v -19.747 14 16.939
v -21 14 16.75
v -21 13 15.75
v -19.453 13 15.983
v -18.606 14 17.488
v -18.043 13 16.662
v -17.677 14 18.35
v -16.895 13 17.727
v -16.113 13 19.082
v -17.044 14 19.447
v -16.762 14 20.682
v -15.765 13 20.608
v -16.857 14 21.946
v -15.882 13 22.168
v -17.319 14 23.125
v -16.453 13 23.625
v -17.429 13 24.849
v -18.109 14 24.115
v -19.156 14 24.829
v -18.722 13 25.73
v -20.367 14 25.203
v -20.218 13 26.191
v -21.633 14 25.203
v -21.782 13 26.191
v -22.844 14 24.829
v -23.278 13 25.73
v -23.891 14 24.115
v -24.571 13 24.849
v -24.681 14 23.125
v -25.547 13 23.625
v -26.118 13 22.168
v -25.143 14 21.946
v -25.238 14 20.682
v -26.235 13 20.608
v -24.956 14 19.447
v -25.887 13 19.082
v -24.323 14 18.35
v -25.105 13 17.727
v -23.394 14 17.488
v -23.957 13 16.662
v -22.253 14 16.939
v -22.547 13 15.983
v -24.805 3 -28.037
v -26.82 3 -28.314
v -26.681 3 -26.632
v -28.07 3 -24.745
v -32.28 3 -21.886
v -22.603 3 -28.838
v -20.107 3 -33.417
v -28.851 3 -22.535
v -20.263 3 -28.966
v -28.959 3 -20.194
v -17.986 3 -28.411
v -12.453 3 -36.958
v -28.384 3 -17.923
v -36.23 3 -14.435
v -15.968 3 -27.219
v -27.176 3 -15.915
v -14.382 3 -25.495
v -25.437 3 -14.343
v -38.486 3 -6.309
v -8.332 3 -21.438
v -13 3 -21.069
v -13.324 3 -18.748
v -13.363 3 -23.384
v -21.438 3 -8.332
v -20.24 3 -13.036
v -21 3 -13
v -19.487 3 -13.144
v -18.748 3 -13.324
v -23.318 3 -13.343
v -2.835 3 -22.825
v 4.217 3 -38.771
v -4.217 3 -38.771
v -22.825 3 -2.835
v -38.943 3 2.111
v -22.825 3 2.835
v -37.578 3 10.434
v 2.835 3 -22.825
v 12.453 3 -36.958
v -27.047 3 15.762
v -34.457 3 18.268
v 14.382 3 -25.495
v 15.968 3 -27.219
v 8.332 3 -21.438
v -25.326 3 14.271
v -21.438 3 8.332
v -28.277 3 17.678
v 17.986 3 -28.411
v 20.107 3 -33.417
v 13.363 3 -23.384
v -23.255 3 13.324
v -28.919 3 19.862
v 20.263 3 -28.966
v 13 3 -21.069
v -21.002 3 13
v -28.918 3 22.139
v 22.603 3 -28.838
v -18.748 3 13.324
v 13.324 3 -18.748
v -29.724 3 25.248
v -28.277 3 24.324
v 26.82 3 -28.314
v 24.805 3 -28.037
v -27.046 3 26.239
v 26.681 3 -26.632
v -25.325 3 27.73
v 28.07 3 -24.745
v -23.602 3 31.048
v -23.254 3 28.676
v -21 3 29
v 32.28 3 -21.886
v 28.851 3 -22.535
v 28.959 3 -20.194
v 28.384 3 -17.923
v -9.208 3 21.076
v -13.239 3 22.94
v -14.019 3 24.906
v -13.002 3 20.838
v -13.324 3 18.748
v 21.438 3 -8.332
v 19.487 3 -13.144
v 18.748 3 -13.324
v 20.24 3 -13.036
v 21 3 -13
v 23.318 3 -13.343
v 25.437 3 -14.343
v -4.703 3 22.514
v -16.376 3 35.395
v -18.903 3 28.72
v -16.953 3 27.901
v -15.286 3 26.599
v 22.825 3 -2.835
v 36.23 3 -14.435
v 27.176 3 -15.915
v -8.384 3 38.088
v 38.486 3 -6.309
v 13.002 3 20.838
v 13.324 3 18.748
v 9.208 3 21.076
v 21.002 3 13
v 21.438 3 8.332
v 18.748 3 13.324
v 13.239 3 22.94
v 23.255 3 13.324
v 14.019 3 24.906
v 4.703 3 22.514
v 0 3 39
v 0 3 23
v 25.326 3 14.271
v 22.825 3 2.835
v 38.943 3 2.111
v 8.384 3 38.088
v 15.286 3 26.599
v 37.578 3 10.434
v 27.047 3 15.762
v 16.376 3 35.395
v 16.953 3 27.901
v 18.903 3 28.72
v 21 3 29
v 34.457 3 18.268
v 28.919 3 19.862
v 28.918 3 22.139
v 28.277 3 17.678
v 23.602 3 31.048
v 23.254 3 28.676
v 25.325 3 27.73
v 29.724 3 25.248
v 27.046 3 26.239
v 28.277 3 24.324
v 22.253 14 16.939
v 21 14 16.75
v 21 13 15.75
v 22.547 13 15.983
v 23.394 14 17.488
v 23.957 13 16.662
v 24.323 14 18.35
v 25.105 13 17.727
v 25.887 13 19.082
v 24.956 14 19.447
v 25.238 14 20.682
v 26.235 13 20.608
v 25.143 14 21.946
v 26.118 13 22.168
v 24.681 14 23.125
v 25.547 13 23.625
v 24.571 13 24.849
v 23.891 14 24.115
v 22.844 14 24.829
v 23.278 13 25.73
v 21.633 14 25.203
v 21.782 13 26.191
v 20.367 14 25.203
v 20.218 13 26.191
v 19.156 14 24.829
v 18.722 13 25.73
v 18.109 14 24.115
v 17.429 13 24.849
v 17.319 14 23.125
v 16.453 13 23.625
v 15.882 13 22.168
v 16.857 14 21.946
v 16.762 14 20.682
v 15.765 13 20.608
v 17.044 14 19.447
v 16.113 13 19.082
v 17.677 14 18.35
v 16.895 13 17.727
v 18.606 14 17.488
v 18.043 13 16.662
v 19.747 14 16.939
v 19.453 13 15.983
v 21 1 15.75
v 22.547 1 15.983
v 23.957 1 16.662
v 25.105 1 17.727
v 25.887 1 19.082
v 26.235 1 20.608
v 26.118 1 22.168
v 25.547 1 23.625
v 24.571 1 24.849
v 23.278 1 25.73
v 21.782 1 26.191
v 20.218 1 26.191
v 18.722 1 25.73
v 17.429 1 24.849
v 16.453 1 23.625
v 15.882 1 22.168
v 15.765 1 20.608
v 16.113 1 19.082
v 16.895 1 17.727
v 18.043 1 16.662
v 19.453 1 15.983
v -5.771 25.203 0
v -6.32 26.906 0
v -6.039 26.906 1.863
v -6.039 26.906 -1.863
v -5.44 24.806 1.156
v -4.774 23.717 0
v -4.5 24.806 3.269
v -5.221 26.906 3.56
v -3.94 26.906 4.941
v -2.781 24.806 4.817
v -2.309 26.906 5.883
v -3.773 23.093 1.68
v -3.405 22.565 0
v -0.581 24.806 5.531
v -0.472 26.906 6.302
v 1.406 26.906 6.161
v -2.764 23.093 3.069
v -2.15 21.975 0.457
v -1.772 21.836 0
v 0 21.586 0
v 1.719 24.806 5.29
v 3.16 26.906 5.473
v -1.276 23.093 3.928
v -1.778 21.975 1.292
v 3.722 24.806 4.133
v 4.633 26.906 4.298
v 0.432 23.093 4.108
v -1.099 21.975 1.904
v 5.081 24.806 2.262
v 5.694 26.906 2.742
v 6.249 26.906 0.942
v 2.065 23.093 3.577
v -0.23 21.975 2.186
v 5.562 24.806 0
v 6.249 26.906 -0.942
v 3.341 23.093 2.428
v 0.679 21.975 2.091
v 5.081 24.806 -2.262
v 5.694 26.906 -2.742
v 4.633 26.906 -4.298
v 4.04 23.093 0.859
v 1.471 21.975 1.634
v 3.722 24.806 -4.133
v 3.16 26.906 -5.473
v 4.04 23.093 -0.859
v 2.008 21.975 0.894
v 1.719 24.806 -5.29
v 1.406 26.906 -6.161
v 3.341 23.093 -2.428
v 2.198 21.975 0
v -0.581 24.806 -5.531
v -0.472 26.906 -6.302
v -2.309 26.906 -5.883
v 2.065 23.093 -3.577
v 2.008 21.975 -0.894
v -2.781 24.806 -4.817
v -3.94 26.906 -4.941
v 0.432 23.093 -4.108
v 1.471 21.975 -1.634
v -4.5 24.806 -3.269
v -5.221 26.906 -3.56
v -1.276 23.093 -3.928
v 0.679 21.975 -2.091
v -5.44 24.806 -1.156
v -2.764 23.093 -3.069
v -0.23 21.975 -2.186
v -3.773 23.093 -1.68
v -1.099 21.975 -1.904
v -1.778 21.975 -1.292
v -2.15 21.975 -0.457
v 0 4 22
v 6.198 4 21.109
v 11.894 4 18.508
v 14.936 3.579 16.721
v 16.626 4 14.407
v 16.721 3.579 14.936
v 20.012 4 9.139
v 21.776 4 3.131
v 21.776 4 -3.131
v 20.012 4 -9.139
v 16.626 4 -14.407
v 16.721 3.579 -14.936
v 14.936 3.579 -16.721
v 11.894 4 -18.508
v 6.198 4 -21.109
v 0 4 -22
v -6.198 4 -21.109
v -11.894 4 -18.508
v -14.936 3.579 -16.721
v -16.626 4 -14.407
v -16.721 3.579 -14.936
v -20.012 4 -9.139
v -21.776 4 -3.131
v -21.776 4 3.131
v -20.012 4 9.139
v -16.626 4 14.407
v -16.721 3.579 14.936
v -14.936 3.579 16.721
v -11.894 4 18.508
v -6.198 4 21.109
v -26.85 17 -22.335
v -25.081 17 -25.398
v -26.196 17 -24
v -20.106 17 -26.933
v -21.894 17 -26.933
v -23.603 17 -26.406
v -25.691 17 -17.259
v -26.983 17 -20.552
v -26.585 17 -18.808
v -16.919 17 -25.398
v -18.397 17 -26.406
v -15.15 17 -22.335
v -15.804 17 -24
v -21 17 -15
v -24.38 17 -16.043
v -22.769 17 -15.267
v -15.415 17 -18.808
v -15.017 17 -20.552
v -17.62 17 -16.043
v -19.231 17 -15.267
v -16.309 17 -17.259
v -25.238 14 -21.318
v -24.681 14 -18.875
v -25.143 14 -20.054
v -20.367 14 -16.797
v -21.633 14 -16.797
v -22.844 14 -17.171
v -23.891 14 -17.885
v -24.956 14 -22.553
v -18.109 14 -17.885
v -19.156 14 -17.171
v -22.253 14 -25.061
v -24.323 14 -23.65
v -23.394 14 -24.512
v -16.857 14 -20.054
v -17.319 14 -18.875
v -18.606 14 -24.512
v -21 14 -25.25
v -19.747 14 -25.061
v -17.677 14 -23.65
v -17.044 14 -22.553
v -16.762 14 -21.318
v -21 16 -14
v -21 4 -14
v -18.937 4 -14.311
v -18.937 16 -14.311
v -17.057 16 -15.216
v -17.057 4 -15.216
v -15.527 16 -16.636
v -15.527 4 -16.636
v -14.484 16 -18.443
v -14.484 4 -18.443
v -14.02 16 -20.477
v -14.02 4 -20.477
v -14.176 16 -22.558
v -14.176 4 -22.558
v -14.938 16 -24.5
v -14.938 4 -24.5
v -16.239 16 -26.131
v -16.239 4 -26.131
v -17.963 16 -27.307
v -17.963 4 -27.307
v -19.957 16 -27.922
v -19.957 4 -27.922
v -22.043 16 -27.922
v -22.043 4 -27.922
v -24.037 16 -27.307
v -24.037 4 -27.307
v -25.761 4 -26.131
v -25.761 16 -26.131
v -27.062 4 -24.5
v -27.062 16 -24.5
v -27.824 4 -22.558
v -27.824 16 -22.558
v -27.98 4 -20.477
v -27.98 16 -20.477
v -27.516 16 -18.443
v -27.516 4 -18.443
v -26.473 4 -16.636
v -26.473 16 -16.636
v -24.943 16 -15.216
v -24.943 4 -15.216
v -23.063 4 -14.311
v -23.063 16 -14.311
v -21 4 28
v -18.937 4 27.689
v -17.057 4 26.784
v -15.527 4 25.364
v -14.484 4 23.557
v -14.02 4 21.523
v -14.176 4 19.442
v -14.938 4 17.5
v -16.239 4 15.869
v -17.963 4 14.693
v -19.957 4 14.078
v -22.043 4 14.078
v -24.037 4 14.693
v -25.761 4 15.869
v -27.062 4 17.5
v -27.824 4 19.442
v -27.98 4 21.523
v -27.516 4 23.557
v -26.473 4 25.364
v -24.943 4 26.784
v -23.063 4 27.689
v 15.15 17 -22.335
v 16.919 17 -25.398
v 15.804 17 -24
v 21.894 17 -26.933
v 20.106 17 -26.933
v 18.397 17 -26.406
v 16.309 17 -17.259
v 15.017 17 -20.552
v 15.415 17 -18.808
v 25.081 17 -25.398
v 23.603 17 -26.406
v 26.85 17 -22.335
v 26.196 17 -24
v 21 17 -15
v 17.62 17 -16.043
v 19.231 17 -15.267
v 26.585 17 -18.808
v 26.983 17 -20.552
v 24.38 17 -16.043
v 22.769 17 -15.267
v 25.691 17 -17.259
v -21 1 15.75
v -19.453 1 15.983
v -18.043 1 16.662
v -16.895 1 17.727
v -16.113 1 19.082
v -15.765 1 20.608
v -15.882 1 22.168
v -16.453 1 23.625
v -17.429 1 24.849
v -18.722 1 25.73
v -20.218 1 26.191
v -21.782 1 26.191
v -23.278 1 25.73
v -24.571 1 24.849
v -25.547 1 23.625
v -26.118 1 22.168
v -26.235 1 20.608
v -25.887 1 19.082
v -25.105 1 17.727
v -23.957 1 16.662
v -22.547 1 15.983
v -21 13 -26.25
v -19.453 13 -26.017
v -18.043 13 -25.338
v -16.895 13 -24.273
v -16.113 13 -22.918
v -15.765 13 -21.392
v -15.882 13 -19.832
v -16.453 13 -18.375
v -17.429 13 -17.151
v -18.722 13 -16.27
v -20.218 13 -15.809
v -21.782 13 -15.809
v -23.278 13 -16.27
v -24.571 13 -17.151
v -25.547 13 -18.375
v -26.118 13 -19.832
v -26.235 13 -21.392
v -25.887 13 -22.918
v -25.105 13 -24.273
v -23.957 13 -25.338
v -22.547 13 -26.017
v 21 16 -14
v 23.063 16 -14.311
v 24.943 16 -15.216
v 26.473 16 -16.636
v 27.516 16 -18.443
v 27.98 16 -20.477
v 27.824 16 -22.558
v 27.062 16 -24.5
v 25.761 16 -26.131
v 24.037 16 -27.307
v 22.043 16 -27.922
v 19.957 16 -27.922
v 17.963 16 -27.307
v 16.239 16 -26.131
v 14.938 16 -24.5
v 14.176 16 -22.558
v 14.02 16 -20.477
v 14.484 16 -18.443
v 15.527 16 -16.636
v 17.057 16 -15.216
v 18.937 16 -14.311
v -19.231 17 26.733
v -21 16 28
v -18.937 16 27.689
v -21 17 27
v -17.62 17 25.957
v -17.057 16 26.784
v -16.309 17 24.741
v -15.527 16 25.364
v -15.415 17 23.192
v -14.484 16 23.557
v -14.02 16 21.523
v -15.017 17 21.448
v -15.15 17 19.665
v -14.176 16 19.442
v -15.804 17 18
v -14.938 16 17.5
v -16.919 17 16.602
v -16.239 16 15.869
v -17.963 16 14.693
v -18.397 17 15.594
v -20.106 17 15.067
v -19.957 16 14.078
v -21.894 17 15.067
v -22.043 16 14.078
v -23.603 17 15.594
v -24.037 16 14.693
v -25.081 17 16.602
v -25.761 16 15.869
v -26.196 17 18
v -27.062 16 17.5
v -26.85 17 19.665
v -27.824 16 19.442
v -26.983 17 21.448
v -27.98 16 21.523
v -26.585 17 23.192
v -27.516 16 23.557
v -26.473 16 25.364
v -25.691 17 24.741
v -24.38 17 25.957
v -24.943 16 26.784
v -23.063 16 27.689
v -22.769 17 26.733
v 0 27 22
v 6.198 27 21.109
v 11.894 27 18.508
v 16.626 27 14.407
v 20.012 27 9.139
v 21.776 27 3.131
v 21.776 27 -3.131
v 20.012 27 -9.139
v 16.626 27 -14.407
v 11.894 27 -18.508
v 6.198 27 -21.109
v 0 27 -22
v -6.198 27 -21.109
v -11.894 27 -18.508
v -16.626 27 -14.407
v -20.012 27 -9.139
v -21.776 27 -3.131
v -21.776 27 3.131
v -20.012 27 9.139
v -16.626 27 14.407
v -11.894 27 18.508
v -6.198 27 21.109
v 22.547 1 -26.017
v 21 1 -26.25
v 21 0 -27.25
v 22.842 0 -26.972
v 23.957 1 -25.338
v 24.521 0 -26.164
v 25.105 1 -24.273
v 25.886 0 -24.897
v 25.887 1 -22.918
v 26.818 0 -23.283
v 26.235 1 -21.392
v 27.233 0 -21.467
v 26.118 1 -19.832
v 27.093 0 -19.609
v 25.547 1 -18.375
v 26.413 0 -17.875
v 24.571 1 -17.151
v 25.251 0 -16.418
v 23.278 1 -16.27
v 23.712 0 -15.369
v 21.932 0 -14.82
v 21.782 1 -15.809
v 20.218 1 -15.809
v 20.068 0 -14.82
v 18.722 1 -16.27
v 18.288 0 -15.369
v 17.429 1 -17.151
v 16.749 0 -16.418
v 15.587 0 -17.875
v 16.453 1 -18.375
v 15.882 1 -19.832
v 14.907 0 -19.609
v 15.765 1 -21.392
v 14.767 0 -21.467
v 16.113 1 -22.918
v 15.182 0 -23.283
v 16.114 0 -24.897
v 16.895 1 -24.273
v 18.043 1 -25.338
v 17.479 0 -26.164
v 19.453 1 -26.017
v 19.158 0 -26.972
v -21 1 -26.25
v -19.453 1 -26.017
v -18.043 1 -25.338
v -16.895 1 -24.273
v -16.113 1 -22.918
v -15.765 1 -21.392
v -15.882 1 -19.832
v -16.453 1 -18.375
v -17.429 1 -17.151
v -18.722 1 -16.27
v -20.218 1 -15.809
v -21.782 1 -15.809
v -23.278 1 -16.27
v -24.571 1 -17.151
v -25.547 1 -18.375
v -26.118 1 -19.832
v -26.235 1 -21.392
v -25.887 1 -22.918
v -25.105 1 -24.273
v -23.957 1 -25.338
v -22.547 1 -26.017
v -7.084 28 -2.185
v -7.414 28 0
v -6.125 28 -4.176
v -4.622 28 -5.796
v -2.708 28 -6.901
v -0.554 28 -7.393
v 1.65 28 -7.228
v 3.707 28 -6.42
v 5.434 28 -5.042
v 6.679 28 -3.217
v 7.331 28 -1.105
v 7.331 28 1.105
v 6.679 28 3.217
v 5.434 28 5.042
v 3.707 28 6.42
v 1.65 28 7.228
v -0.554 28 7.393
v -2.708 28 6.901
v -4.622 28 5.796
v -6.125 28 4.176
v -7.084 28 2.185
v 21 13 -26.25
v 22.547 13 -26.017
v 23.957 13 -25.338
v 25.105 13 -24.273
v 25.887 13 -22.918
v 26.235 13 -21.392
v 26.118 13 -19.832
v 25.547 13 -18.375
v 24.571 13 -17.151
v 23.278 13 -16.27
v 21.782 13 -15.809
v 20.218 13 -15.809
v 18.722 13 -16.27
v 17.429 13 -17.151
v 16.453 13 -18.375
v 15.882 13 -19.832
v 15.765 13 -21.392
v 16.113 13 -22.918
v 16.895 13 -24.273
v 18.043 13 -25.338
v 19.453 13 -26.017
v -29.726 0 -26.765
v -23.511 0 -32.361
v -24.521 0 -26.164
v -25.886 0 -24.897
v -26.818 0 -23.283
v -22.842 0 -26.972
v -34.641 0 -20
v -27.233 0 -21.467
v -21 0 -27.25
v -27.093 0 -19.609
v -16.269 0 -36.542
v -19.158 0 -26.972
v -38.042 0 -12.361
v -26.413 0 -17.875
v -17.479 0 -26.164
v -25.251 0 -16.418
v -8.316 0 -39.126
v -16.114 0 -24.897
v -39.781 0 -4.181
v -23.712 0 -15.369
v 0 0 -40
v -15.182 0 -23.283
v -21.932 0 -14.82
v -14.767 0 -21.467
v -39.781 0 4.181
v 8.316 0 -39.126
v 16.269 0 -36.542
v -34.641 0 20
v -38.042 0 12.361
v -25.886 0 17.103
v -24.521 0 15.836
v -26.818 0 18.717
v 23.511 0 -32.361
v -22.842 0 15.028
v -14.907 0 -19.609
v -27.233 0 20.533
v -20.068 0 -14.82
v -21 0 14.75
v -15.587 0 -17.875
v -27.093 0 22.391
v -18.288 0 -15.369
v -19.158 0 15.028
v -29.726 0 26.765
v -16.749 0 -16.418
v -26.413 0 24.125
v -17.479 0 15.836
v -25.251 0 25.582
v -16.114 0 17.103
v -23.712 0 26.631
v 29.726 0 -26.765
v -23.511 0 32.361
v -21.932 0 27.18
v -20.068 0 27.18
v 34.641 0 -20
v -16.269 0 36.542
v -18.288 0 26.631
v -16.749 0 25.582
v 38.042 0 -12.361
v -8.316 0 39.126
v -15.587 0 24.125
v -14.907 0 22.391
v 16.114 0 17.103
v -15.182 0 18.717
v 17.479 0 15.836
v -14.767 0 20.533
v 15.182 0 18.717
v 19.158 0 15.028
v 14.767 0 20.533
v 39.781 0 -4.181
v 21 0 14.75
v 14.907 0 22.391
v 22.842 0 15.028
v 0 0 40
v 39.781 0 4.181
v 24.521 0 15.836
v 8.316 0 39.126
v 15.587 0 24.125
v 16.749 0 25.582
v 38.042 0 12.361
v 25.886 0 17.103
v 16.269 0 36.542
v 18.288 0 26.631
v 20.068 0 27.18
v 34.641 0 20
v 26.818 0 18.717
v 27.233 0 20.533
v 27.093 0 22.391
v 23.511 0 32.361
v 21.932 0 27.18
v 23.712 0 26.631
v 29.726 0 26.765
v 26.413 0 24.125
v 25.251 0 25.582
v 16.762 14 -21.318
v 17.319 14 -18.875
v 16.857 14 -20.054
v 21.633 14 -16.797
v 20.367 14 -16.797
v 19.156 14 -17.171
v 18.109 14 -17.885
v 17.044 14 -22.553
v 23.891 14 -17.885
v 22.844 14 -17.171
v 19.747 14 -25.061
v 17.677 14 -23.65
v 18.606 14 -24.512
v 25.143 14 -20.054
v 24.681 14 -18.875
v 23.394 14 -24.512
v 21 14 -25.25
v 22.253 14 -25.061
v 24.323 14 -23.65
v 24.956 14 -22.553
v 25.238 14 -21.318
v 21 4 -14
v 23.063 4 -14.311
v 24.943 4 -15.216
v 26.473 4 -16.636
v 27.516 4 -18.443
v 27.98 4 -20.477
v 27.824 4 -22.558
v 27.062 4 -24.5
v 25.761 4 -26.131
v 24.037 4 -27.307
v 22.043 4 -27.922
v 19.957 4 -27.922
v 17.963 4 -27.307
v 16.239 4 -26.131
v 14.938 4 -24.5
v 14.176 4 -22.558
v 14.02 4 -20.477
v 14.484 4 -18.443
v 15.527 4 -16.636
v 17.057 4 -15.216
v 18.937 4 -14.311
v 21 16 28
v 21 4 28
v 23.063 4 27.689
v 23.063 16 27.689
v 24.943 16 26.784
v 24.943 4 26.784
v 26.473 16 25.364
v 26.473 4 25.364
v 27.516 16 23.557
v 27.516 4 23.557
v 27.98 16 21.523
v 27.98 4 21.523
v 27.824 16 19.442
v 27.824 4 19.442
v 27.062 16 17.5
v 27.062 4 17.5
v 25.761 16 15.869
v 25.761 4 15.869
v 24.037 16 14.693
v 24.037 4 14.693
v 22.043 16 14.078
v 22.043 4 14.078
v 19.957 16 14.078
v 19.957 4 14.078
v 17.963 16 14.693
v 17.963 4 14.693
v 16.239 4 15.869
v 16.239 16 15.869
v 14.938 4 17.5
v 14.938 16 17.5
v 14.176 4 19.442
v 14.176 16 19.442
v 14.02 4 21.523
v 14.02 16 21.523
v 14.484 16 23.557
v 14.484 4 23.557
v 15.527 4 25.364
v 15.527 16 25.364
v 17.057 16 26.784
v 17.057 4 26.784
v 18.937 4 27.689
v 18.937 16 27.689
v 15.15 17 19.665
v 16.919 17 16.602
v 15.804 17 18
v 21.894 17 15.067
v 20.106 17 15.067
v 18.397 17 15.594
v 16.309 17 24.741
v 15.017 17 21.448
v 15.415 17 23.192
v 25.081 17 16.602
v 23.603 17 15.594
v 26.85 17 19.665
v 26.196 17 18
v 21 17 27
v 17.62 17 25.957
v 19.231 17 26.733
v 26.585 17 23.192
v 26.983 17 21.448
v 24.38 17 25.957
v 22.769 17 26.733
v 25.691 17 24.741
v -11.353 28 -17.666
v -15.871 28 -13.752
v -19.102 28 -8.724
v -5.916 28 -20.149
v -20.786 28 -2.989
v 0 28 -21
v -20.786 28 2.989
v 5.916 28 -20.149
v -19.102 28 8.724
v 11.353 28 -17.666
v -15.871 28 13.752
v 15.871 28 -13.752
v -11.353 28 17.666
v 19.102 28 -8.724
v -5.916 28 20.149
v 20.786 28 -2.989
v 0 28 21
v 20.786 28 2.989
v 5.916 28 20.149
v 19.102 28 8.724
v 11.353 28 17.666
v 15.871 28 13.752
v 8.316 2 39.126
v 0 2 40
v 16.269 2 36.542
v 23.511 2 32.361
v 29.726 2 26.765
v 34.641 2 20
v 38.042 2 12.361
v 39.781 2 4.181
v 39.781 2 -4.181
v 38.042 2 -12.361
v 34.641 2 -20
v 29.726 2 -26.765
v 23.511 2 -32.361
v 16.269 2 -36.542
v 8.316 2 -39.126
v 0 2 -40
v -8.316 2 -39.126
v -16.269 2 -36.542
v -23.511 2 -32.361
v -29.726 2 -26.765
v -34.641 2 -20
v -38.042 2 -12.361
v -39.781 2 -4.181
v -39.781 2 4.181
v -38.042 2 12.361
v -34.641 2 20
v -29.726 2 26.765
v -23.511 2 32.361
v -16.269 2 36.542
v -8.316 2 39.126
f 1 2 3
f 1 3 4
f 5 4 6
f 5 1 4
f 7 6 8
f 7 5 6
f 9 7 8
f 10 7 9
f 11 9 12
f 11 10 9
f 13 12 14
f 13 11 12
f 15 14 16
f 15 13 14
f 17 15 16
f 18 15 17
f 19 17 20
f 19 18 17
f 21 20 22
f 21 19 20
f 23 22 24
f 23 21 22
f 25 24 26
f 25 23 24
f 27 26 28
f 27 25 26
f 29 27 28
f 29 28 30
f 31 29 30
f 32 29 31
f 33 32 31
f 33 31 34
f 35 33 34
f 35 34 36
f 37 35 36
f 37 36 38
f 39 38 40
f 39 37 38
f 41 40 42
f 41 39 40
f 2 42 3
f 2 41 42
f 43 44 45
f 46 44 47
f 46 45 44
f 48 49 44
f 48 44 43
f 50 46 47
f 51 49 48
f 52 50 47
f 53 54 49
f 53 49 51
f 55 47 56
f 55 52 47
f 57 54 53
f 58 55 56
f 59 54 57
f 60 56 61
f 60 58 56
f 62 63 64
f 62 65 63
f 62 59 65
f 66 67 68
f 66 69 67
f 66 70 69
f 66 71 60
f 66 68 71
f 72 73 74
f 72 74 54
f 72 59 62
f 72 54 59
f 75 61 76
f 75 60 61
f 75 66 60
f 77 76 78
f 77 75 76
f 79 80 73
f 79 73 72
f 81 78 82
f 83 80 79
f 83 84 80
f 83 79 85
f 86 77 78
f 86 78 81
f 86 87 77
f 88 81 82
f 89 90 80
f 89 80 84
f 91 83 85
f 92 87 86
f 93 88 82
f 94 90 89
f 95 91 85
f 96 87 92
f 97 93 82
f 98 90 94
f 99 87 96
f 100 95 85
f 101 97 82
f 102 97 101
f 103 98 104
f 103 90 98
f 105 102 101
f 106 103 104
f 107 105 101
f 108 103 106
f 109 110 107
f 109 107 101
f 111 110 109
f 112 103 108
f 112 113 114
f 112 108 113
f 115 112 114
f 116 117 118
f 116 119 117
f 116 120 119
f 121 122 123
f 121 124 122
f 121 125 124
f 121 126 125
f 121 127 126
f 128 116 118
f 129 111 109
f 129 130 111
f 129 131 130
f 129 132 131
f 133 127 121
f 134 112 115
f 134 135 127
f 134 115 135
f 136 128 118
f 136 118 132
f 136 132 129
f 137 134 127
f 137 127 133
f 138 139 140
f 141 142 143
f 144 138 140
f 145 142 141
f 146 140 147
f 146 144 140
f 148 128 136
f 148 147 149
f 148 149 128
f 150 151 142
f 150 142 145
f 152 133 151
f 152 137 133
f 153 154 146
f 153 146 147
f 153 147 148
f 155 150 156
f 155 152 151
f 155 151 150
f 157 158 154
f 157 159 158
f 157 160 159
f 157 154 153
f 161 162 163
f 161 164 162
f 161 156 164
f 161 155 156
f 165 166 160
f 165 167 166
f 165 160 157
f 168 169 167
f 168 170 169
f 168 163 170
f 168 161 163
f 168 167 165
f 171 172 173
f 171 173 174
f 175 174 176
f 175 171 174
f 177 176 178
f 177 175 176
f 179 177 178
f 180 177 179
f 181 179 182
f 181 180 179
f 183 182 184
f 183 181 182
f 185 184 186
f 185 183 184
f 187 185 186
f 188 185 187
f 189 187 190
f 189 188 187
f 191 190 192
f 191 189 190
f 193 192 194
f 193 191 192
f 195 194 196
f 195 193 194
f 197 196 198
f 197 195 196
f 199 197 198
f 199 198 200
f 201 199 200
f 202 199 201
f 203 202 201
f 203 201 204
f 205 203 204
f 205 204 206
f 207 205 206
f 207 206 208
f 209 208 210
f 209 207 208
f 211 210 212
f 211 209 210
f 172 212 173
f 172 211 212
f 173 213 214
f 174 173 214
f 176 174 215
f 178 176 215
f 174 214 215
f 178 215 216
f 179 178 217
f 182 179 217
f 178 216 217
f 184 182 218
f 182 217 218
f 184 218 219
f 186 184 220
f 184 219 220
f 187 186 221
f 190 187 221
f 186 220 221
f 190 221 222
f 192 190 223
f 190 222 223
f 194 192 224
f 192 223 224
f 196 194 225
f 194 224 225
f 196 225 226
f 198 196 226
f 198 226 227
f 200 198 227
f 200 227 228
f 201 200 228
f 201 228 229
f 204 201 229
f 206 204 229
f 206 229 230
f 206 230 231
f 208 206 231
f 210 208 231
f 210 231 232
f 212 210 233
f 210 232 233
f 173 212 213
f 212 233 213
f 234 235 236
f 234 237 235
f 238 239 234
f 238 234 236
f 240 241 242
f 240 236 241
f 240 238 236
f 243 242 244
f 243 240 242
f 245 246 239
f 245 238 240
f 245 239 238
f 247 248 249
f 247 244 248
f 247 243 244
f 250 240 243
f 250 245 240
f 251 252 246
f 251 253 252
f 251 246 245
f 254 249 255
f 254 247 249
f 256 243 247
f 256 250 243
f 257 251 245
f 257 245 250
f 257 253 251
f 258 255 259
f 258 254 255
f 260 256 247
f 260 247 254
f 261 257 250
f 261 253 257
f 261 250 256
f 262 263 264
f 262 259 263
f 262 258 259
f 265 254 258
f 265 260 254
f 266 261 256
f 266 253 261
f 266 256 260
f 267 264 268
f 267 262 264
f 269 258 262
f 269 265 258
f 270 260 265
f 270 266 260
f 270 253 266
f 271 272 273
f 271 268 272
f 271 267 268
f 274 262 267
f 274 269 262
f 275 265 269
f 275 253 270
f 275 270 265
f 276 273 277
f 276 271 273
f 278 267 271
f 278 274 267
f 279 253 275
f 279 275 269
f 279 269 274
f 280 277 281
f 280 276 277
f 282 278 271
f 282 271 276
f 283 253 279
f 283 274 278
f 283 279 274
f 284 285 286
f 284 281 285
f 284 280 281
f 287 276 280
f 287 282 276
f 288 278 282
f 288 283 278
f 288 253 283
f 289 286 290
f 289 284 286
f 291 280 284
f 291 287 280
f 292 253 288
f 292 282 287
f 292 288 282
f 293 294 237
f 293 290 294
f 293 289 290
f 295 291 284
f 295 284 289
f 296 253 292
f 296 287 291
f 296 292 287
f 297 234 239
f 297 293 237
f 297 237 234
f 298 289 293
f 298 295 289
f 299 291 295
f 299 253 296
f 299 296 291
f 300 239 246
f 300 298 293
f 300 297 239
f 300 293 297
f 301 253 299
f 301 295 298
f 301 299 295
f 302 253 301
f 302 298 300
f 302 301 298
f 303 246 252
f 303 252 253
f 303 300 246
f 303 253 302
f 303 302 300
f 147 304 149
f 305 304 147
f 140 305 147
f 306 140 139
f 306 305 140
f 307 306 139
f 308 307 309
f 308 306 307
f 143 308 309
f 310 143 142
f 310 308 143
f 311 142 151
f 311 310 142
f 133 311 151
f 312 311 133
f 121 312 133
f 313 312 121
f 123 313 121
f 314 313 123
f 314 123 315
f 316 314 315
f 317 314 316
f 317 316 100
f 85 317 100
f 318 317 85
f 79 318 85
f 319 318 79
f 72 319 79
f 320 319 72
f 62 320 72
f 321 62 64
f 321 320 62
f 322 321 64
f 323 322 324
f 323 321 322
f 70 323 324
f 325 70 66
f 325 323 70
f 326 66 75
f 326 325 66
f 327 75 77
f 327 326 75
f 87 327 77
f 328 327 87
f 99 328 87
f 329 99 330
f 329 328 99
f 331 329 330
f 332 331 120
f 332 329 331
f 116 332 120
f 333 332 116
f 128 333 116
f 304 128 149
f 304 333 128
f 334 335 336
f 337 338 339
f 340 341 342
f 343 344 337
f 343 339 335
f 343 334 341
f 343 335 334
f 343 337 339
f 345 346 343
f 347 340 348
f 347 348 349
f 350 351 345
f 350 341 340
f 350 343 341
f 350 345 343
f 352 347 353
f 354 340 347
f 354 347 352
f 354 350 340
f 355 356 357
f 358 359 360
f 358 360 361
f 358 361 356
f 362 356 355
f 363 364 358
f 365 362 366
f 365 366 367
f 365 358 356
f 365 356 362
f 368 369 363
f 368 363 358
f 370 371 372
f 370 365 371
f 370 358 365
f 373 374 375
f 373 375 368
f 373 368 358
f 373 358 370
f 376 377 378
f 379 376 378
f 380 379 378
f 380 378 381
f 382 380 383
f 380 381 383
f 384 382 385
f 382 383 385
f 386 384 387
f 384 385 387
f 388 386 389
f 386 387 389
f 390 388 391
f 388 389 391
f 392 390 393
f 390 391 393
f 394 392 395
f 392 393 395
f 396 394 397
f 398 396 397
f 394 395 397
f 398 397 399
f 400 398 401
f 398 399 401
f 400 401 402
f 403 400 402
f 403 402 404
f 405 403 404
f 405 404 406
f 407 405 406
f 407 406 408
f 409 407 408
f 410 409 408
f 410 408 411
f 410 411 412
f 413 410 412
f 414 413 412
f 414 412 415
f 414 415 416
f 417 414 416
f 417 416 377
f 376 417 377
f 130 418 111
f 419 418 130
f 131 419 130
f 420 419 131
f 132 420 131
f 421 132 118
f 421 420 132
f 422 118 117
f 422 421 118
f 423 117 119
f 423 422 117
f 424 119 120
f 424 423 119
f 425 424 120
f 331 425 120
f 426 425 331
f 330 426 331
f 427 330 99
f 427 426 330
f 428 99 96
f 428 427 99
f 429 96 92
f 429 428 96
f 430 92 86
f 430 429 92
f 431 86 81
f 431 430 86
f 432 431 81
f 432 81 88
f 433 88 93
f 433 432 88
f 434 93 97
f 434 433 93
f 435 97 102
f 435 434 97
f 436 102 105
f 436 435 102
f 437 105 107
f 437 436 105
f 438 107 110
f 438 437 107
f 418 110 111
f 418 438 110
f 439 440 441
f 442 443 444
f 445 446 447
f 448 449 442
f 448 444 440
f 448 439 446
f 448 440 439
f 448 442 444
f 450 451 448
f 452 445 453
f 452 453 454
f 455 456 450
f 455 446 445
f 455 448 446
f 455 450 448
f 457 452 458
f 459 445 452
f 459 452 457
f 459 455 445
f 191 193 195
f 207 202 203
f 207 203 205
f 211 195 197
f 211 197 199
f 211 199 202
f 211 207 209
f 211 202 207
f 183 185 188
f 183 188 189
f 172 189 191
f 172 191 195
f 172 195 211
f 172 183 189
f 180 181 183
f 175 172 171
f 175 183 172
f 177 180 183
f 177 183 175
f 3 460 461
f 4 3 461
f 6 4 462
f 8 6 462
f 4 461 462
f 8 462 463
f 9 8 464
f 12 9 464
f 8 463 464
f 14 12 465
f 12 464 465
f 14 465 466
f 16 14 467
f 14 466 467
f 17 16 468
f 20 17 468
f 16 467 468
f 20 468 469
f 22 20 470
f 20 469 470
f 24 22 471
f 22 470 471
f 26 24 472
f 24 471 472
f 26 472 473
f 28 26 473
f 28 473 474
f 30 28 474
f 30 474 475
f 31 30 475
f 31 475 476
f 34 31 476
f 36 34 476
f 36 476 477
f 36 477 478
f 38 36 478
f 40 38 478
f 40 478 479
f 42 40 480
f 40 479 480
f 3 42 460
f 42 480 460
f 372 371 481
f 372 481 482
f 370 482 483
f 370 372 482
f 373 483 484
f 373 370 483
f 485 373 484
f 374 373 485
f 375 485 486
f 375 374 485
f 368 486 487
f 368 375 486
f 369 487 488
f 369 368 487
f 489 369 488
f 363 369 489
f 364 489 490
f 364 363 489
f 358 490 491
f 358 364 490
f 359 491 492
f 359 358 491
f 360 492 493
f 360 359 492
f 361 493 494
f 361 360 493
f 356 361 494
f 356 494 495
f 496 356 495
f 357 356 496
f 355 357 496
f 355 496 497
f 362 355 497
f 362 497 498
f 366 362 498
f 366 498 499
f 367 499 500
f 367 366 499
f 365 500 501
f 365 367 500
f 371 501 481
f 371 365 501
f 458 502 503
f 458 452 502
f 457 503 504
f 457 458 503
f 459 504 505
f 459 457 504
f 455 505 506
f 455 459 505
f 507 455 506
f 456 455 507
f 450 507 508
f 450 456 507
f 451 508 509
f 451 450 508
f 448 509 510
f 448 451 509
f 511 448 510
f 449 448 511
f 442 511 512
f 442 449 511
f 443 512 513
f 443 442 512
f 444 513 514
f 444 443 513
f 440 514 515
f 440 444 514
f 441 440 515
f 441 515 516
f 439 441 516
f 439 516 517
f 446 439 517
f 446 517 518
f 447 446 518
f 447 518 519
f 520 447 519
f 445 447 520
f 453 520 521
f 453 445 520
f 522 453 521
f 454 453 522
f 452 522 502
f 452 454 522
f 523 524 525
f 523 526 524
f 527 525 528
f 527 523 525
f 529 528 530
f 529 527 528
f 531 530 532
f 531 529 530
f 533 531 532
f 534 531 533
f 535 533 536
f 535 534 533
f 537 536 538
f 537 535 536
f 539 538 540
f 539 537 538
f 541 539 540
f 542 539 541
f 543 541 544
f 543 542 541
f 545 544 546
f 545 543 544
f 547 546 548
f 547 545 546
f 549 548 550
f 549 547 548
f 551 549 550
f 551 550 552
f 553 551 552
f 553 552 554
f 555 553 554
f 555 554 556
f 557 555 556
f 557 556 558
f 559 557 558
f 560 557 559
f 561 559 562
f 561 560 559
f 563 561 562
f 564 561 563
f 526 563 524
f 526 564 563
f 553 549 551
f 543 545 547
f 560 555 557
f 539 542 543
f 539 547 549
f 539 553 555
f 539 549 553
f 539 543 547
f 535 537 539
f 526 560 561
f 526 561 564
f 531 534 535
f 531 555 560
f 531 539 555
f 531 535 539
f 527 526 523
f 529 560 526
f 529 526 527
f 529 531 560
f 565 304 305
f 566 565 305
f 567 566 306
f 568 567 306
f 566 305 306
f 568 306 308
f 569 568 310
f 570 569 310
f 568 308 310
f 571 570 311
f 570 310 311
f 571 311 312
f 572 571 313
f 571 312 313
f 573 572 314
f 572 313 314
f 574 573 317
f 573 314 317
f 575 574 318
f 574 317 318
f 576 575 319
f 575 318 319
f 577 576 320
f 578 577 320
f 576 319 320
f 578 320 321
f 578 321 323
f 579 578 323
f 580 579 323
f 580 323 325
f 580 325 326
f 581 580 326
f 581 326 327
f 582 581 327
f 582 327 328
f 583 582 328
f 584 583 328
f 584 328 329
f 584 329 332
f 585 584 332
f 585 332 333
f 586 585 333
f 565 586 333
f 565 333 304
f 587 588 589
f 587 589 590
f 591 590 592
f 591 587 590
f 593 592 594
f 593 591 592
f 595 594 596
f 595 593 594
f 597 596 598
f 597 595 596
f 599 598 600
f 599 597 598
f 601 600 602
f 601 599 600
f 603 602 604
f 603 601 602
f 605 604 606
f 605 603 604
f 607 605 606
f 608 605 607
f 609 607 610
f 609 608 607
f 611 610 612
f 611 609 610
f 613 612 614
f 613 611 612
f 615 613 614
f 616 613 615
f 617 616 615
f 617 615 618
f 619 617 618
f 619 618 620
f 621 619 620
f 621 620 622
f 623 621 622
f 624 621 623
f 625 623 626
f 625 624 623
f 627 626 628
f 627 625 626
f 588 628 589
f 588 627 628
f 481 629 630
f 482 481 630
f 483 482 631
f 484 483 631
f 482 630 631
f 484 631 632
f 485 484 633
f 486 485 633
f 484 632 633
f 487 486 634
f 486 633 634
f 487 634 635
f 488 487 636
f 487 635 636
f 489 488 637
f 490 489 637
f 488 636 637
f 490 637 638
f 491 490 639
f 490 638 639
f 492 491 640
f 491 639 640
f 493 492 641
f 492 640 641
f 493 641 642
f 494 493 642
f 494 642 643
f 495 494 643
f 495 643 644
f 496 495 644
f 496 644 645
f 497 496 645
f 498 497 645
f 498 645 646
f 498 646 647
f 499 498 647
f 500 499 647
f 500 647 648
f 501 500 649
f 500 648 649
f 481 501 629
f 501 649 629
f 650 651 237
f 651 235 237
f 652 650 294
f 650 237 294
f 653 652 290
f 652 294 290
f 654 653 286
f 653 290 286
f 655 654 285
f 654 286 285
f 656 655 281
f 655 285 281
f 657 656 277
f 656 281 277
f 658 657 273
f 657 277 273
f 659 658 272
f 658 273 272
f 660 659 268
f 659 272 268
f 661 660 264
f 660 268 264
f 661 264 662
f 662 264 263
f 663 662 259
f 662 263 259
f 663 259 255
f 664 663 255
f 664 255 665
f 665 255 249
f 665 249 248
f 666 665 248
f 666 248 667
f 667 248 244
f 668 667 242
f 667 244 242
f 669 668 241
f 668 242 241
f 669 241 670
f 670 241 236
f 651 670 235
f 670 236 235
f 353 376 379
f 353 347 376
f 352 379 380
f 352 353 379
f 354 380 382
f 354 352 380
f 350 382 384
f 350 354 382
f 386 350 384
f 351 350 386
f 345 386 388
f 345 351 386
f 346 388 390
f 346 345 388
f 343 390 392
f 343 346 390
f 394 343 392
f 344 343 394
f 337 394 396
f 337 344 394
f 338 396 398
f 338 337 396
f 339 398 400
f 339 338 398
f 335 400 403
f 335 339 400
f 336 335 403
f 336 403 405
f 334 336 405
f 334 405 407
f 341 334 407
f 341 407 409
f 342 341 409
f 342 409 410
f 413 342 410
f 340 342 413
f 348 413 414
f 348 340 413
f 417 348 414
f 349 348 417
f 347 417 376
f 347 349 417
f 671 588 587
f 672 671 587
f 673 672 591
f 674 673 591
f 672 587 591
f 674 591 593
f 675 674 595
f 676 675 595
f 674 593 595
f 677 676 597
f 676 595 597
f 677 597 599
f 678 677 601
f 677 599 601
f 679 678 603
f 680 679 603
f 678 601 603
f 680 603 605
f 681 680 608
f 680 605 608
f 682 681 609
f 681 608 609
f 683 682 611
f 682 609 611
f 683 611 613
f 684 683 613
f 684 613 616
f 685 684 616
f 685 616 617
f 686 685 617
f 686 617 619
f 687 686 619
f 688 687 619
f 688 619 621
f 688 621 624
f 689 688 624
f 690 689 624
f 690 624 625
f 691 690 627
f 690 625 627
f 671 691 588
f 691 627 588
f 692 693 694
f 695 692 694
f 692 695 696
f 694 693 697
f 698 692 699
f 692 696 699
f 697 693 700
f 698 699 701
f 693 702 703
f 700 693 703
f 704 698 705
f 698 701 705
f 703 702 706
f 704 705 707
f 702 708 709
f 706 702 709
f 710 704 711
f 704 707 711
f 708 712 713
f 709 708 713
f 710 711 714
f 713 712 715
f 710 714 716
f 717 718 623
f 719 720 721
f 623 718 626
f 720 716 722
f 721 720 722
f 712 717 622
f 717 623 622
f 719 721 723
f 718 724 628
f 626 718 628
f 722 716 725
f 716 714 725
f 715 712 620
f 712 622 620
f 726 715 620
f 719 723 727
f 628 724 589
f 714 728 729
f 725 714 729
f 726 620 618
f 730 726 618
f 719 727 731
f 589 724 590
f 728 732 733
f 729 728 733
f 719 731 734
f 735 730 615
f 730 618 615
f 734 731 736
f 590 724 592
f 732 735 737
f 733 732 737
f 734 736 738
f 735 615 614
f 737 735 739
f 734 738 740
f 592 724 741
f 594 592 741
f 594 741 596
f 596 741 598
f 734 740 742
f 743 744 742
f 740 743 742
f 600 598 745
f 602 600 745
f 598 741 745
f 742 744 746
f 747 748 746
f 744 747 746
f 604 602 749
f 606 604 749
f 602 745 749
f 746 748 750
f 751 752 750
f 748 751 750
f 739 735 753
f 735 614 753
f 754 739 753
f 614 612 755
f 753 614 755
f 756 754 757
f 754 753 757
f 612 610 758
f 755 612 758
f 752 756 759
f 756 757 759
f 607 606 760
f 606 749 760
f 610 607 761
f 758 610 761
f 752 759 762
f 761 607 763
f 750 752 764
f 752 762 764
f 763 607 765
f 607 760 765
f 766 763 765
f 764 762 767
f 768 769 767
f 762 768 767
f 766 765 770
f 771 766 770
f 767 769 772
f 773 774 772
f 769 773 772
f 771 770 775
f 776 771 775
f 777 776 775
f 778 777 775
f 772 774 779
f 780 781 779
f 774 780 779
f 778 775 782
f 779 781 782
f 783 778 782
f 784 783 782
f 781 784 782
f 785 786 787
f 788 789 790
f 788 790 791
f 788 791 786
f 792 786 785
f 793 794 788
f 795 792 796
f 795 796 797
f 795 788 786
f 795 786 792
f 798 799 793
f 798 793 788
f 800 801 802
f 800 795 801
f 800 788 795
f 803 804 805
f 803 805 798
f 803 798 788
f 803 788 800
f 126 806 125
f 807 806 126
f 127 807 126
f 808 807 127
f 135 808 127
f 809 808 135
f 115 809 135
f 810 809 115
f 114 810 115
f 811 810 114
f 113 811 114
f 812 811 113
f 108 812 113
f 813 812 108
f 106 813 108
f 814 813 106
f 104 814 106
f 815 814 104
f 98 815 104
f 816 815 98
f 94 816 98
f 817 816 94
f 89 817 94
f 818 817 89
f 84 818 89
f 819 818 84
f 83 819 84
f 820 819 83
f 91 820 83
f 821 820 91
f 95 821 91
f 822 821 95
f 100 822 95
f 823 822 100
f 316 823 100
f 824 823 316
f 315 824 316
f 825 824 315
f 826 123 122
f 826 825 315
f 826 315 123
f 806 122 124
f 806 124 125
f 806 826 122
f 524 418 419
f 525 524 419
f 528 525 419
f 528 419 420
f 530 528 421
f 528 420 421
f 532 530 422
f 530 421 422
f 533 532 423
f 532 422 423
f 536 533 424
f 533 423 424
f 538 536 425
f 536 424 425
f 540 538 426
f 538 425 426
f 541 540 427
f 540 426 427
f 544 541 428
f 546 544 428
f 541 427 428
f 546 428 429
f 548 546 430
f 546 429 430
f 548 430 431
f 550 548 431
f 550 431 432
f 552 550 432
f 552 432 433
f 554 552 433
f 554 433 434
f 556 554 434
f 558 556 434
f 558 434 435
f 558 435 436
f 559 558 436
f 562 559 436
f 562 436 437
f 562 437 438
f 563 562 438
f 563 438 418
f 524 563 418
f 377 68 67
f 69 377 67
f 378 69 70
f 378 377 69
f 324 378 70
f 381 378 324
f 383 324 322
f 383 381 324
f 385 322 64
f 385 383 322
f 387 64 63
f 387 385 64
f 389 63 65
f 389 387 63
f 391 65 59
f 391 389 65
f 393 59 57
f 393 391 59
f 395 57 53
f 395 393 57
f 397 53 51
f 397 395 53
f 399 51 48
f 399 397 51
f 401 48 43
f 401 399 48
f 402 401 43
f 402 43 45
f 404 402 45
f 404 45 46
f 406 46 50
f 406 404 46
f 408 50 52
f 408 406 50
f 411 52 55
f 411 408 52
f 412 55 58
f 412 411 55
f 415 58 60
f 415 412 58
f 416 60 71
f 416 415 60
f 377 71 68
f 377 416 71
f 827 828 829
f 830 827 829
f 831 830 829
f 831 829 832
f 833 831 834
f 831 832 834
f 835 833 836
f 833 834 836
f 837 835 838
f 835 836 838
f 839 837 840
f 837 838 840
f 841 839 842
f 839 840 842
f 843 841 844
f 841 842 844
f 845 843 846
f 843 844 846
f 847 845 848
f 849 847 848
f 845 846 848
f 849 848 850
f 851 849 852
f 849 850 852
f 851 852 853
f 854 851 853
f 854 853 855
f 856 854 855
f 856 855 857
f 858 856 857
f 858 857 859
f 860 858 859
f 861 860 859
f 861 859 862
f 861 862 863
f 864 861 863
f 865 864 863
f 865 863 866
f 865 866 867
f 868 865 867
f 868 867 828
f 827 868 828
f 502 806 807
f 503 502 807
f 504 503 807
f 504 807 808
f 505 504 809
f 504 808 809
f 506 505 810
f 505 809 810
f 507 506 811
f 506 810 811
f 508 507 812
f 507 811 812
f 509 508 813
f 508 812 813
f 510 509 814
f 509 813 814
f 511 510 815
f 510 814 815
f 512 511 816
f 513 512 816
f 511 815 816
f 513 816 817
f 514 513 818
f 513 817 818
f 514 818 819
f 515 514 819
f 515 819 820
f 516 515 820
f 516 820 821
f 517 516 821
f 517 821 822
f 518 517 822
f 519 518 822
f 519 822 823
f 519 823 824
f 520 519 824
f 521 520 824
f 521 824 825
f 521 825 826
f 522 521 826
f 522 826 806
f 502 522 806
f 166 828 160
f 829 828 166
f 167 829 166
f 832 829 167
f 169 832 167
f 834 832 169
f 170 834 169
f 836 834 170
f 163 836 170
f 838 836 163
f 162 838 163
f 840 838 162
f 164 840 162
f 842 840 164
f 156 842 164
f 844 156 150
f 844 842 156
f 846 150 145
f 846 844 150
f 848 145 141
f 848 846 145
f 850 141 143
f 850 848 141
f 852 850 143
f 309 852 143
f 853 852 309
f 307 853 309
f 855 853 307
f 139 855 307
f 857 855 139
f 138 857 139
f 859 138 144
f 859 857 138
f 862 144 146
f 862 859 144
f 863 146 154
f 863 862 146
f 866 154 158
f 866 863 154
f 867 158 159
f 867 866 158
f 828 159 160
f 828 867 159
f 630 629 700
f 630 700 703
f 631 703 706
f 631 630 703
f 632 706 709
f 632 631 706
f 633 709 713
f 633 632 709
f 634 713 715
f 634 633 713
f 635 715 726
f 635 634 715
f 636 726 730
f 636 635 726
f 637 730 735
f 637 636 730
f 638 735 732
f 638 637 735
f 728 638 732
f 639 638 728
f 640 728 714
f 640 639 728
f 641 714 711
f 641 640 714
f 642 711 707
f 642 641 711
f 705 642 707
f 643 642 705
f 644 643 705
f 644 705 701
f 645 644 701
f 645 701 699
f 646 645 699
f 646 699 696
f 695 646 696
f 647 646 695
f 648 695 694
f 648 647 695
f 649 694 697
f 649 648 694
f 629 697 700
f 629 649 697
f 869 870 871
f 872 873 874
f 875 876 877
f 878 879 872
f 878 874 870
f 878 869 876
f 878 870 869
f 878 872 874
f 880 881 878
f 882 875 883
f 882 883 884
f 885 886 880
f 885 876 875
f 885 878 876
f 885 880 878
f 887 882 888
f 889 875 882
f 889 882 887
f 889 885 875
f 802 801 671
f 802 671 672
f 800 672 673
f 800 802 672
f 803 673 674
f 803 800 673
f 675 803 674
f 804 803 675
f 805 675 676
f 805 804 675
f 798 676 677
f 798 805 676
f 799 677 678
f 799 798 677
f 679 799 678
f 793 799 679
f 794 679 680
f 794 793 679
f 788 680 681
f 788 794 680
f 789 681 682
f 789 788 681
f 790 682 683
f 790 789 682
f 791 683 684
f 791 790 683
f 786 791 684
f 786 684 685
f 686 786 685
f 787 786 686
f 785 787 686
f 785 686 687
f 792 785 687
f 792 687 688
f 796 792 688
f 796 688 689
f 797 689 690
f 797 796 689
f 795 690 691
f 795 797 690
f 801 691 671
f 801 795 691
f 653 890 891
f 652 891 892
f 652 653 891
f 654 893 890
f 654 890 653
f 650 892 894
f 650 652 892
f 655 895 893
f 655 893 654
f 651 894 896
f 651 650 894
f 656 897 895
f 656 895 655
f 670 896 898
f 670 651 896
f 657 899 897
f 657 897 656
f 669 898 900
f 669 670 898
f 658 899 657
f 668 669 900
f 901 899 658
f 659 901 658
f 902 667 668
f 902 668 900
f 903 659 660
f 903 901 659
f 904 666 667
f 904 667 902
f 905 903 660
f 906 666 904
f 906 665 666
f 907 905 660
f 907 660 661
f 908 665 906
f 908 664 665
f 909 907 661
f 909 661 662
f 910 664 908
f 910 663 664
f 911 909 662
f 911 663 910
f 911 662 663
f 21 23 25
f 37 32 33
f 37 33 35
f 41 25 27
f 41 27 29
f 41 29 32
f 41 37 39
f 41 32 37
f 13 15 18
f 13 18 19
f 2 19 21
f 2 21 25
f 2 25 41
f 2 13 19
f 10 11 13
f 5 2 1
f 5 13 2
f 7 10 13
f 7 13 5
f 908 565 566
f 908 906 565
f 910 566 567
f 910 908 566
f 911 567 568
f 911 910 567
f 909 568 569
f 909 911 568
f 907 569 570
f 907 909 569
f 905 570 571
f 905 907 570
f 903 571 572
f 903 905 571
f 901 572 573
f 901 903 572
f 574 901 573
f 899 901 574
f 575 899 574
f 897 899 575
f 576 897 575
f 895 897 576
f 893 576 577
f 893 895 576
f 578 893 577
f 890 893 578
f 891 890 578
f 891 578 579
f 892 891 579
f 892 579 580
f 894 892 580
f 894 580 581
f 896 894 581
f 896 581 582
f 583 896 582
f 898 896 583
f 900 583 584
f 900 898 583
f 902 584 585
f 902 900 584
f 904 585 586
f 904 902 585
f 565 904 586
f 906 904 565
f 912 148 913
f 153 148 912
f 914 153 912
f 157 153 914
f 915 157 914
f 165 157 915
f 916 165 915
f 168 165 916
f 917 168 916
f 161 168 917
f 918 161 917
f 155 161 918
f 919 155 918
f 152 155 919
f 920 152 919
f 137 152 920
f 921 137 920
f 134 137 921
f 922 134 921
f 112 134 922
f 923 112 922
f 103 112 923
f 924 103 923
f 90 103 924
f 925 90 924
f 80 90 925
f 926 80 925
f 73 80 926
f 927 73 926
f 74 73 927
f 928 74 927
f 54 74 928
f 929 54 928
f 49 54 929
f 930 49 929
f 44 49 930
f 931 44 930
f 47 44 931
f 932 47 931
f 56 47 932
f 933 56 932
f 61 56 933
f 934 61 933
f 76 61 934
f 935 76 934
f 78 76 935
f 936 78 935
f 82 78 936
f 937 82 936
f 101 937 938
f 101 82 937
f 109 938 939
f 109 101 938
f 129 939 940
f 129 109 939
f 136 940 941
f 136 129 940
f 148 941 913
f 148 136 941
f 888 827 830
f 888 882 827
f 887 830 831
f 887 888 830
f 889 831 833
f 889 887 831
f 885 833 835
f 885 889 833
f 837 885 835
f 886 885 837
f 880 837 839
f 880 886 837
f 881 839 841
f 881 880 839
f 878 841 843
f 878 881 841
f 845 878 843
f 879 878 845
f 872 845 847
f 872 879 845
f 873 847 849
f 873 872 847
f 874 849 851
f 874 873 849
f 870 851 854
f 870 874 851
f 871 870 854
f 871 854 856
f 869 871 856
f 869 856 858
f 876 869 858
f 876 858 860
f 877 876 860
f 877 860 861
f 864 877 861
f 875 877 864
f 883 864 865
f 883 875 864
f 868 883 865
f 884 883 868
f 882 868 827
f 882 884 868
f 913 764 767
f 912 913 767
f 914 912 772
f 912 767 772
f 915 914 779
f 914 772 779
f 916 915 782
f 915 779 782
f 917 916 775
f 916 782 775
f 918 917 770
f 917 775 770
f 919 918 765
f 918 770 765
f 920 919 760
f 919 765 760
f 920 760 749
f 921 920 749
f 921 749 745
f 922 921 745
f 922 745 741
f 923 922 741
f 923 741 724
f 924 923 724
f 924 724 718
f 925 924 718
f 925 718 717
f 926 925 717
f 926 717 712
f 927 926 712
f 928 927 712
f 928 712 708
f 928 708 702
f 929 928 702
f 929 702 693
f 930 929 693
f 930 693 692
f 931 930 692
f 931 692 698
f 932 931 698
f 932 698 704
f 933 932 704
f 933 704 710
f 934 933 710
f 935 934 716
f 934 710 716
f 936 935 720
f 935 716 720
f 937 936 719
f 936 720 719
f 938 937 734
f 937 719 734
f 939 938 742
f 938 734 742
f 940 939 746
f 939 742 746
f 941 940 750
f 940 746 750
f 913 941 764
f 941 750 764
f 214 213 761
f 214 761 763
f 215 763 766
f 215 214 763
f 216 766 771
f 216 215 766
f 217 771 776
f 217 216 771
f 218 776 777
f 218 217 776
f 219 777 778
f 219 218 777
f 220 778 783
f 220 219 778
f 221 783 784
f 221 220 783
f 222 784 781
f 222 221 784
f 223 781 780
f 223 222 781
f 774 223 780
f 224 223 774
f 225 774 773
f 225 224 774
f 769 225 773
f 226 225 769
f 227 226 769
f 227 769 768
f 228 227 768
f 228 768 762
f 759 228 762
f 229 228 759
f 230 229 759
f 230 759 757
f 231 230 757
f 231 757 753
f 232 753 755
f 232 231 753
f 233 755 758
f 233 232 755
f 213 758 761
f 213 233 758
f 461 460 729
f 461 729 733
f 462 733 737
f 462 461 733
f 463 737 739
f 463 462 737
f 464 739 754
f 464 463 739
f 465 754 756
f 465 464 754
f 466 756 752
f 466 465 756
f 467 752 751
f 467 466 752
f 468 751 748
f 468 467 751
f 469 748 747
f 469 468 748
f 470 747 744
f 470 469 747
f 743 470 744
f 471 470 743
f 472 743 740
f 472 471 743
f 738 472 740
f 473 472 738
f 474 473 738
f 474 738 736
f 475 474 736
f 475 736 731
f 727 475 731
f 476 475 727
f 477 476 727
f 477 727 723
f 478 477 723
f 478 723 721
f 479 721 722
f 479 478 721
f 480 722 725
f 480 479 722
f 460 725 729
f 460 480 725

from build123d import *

# Parameters (mm, degrees)
SKETCH1_R                 = 40
HOLDER_BASE_DEPTH         = 3
SKETCH2_R                 = 22
BALL_HOLDER_EXTRUDE_DEPTH = 25
SKETCH3_R                 = 7
PEG_EXTRUDES_DEPTH        = 14
SKETCH4_R                 = 5.25
PEG_HOLES_DEPTH           = 14
CHAMFER1_SIZE             = 1
CHAMFER2_SIZE             = 1


with BuildPart() as part:
    # Sketch1 → Holder Base (new body)
    with BuildSketch(Plane(origin=(0, 0, 0), x_dir=(1, 0, 0), z_dir=(0, 1, 0))):
        with Locations(Location((0, 0, 0), (0, 0, 270))):
            Circle(SKETCH1_R)
    extrude(amount=HOLDER_BASE_DEPTH)

    # Sketch2 → Ball Holder Extrude (add)
    with BuildSketch(Plane(origin=(0, 3, 0), x_dir=(1, 0, 0), z_dir=(0, 1, 0))):
        with Locations(Location((0, 0, 0), (0, 0, 270))):
            Circle(SKETCH2_R)
    extrude(amount=BALL_HOLDER_EXTRUDE_DEPTH)

    # Sketch5 → Ball Cut (revolve, cut)
    with BuildSketch(Plane.XY):
        with BuildLine():
            Line((0, 21.5865), (0, 34.4135))
            ThreePointArc((0, 34.4135), (-6.4135, 28), (0, 21.5865))
        make_face()
    revolve(axis=Axis((0, -1000, 0), (0, 1, 0)), mode=Mode.SUBTRACT)

    # Sketch3 → Peg Extrudes (add)
    with BuildSketch(Plane(origin=(0, 3, 0), x_dir=(1, 0, 0), z_dir=(0, 1, 0))):
        with Locations(Location((-21, 21, 0), (0, 0, 270))):
            Circle(SKETCH3_R)
        with Locations(Location((21, 21, 0), (0, 0, 270))):
            Circle(SKETCH3_R)
        with Locations(Location((21, -21, 0), (0, 0, 270))):
            Circle(SKETCH3_R)
        with Locations(Location((-21, -21, 0), (0, 0, 270))):
            Circle(SKETCH3_R)
    extrude(amount=PEG_EXTRUDES_DEPTH)

    # Sketch4 → Peg Holes (cut)
    with BuildSketch(Plane.XZ):
        with Locations(Location((-21, -21, 0), (0, 0, 270))):
            Circle(SKETCH4_R)
        with Locations(Location((-21, 21, 0), (0, 0, 270))):
            Circle(SKETCH4_R)
        with Locations(Location((21, 21, 0), (0, 0, 270))):
            Circle(SKETCH4_R)
        with Locations(Location((21, -21, 0), (0, 0, 270))):
            Circle(SKETCH4_R)
    extrude(amount=-PEG_HOLES_DEPTH, mode=Mode.SUBTRACT)

    # Chamfer1
    # the kernel refuses this chamfer: 1 mm, written as the material it adds along each edge
    with BuildSketch(Plane(origin=(-21, 3, -21), x_dir=(0, 0, 1), z_dir=(-1, 0, 0))) as chamfer1_piece_1:
        Polygon((7 + CHAMFER1_SIZE, 0), (7, CHAMFER1_SIZE), (7, 0), align=None)
    revolve(axis=Axis((-21, 3, -21), (0, 1, 0)))
    with BuildSketch(Plane(origin=(21, 3, -21), x_dir=(0, 0, 1), z_dir=(-1, 0, 0))) as chamfer1_piece_2:
        Polygon((7 + CHAMFER1_SIZE, 0), (7, CHAMFER1_SIZE), (7, 0), align=None)
    revolve(axis=Axis((21, 3, -21), (0, 1, 0)))
    with BuildSketch(Plane(origin=(21, 3, 21), x_dir=(0, 0, 1), z_dir=(-1, 0, 0))) as chamfer1_piece_3:
        Polygon((7 + CHAMFER1_SIZE, 0), (7, CHAMFER1_SIZE), (7, 0), align=None)
    revolve(axis=Axis((21, 3, 21), (0, 1, 0)))
    with BuildSketch(Plane(origin=(-21, 3, 21), x_dir=(0, 0, 1), z_dir=(-1, 0, 0))) as chamfer1_piece_4:
        Polygon((7 + CHAMFER1_SIZE, 0), (7, CHAMFER1_SIZE), (7, 0), align=None)
    revolve(axis=Axis((-21, 3, 21), (0, 1, 0)))
    with BuildSketch(Plane(origin=(0, 3, 0), x_dir=(0, 0, 1), z_dir=(-1, 0, 0))) as chamfer1_piece_5:
        Polygon((22 + CHAMFER1_SIZE, 0), (22, CHAMFER1_SIZE), (22, 0), align=None)
    revolve(axis=Axis((0, 3, 0), (0, 1, 0)))
    # the kernel refuses this chamfer: 1 mm, written as the material it takes off along each edge
    with BuildSketch(Plane(origin=(0, 28, 0), x_dir=(-1, 0, 0), z_dir=(0, 0, 1))) as chamfer1_2_piece_1:
        with BuildLine():
            Line((6.4135 + CHAMFER1_SIZE, 0), (6.319506315, 1.093993685))
            ThreePointArc((6.319506315, 1.093993685), (6.388622712, 0.564342173), (6.4135, 0))
            Line((6.4135, 0), (6.4135 + CHAMFER1_SIZE, 0))
        make_face()
    revolve(axis=Axis((0, 28, 0), (0, -1, 0)), mode=Mode.SUBTRACT)
    with BuildSketch(Plane(origin=(-21, 17, -21), x_dir=(0, 0, 1), z_dir=(-1, 0, 0))) as chamfer1_2_piece_2:
        Polygon((7, -CHAMFER1_SIZE), (7 - CHAMFER1_SIZE, 0), (7, 0), align=None)
    revolve(axis=Axis((-21, 17, -21), (0, 1, 0)), mode=Mode.SUBTRACT)
    with BuildSketch(Plane(origin=(21, 17, -21), x_dir=(0, 0, 1), z_dir=(-1, 0, 0))) as chamfer1_2_piece_3:
        Polygon((7, -CHAMFER1_SIZE), (7 - CHAMFER1_SIZE, 0), (7, 0), align=None)
    revolve(axis=Axis((21, 17, -21), (0, 1, 0)), mode=Mode.SUBTRACT)
    with BuildSketch(Plane(origin=(21, 17, 21), x_dir=(0, 0, 1), z_dir=(-1, 0, 0))) as chamfer1_2_piece_4:
        Polygon((7, -CHAMFER1_SIZE), (7 - CHAMFER1_SIZE, 0), (7, 0), align=None)
    revolve(axis=Axis((21, 17, 21), (0, 1, 0)), mode=Mode.SUBTRACT)
    with BuildSketch(Plane(origin=(-21, 17, 21), x_dir=(0, 0, 1), z_dir=(-1, 0, 0))) as chamfer1_2_piece_5:
        Polygon((7, -CHAMFER1_SIZE), (7 - CHAMFER1_SIZE, 0), (7, 0), align=None)
    revolve(axis=Axis((-21, 17, 21), (0, 1, 0)), mode=Mode.SUBTRACT)
    with BuildSketch(Plane(origin=(0, 3, 0), x_dir=(0, 0, 1), z_dir=(-1, 0, 0))) as chamfer1_2_piece_6:
        Polygon((40, -CHAMFER1_SIZE), (40 - CHAMFER1_SIZE, 0), (40, 0), align=None)
    revolve(axis=Axis((0, 3, 0), (0, 1, 0)), mode=Mode.SUBTRACT)
    with BuildSketch(Plane(origin=(0, 28, 0), x_dir=(0, 0, 1), z_dir=(-1, 0, 0))) as chamfer1_2_piece_7:
        Polygon((22, -CHAMFER1_SIZE), (22 - CHAMFER1_SIZE, 0), (22, 0), align=None)
    revolve(axis=Axis((0, 28, 0), (0, 1, 0)), mode=Mode.SUBTRACT)

    # Chamfer2
    chamfer2_edges = [part.edges().sort_by_distance(p)[0] for p in [
        (21, 14, -15.75),
        (21, 0, -15.75),
        (21, 14, 26.25),
        (21, 0, 26.25),
        (-21, 14, 26.25),
        (-21, 0, 26.25),
        (-21, 14, -15.75),
        (-21, 0, -15.75),
    ]]
    chamfer(chamfer2_edges, length=CHAMFER2_SIZE)


solid = part.part
